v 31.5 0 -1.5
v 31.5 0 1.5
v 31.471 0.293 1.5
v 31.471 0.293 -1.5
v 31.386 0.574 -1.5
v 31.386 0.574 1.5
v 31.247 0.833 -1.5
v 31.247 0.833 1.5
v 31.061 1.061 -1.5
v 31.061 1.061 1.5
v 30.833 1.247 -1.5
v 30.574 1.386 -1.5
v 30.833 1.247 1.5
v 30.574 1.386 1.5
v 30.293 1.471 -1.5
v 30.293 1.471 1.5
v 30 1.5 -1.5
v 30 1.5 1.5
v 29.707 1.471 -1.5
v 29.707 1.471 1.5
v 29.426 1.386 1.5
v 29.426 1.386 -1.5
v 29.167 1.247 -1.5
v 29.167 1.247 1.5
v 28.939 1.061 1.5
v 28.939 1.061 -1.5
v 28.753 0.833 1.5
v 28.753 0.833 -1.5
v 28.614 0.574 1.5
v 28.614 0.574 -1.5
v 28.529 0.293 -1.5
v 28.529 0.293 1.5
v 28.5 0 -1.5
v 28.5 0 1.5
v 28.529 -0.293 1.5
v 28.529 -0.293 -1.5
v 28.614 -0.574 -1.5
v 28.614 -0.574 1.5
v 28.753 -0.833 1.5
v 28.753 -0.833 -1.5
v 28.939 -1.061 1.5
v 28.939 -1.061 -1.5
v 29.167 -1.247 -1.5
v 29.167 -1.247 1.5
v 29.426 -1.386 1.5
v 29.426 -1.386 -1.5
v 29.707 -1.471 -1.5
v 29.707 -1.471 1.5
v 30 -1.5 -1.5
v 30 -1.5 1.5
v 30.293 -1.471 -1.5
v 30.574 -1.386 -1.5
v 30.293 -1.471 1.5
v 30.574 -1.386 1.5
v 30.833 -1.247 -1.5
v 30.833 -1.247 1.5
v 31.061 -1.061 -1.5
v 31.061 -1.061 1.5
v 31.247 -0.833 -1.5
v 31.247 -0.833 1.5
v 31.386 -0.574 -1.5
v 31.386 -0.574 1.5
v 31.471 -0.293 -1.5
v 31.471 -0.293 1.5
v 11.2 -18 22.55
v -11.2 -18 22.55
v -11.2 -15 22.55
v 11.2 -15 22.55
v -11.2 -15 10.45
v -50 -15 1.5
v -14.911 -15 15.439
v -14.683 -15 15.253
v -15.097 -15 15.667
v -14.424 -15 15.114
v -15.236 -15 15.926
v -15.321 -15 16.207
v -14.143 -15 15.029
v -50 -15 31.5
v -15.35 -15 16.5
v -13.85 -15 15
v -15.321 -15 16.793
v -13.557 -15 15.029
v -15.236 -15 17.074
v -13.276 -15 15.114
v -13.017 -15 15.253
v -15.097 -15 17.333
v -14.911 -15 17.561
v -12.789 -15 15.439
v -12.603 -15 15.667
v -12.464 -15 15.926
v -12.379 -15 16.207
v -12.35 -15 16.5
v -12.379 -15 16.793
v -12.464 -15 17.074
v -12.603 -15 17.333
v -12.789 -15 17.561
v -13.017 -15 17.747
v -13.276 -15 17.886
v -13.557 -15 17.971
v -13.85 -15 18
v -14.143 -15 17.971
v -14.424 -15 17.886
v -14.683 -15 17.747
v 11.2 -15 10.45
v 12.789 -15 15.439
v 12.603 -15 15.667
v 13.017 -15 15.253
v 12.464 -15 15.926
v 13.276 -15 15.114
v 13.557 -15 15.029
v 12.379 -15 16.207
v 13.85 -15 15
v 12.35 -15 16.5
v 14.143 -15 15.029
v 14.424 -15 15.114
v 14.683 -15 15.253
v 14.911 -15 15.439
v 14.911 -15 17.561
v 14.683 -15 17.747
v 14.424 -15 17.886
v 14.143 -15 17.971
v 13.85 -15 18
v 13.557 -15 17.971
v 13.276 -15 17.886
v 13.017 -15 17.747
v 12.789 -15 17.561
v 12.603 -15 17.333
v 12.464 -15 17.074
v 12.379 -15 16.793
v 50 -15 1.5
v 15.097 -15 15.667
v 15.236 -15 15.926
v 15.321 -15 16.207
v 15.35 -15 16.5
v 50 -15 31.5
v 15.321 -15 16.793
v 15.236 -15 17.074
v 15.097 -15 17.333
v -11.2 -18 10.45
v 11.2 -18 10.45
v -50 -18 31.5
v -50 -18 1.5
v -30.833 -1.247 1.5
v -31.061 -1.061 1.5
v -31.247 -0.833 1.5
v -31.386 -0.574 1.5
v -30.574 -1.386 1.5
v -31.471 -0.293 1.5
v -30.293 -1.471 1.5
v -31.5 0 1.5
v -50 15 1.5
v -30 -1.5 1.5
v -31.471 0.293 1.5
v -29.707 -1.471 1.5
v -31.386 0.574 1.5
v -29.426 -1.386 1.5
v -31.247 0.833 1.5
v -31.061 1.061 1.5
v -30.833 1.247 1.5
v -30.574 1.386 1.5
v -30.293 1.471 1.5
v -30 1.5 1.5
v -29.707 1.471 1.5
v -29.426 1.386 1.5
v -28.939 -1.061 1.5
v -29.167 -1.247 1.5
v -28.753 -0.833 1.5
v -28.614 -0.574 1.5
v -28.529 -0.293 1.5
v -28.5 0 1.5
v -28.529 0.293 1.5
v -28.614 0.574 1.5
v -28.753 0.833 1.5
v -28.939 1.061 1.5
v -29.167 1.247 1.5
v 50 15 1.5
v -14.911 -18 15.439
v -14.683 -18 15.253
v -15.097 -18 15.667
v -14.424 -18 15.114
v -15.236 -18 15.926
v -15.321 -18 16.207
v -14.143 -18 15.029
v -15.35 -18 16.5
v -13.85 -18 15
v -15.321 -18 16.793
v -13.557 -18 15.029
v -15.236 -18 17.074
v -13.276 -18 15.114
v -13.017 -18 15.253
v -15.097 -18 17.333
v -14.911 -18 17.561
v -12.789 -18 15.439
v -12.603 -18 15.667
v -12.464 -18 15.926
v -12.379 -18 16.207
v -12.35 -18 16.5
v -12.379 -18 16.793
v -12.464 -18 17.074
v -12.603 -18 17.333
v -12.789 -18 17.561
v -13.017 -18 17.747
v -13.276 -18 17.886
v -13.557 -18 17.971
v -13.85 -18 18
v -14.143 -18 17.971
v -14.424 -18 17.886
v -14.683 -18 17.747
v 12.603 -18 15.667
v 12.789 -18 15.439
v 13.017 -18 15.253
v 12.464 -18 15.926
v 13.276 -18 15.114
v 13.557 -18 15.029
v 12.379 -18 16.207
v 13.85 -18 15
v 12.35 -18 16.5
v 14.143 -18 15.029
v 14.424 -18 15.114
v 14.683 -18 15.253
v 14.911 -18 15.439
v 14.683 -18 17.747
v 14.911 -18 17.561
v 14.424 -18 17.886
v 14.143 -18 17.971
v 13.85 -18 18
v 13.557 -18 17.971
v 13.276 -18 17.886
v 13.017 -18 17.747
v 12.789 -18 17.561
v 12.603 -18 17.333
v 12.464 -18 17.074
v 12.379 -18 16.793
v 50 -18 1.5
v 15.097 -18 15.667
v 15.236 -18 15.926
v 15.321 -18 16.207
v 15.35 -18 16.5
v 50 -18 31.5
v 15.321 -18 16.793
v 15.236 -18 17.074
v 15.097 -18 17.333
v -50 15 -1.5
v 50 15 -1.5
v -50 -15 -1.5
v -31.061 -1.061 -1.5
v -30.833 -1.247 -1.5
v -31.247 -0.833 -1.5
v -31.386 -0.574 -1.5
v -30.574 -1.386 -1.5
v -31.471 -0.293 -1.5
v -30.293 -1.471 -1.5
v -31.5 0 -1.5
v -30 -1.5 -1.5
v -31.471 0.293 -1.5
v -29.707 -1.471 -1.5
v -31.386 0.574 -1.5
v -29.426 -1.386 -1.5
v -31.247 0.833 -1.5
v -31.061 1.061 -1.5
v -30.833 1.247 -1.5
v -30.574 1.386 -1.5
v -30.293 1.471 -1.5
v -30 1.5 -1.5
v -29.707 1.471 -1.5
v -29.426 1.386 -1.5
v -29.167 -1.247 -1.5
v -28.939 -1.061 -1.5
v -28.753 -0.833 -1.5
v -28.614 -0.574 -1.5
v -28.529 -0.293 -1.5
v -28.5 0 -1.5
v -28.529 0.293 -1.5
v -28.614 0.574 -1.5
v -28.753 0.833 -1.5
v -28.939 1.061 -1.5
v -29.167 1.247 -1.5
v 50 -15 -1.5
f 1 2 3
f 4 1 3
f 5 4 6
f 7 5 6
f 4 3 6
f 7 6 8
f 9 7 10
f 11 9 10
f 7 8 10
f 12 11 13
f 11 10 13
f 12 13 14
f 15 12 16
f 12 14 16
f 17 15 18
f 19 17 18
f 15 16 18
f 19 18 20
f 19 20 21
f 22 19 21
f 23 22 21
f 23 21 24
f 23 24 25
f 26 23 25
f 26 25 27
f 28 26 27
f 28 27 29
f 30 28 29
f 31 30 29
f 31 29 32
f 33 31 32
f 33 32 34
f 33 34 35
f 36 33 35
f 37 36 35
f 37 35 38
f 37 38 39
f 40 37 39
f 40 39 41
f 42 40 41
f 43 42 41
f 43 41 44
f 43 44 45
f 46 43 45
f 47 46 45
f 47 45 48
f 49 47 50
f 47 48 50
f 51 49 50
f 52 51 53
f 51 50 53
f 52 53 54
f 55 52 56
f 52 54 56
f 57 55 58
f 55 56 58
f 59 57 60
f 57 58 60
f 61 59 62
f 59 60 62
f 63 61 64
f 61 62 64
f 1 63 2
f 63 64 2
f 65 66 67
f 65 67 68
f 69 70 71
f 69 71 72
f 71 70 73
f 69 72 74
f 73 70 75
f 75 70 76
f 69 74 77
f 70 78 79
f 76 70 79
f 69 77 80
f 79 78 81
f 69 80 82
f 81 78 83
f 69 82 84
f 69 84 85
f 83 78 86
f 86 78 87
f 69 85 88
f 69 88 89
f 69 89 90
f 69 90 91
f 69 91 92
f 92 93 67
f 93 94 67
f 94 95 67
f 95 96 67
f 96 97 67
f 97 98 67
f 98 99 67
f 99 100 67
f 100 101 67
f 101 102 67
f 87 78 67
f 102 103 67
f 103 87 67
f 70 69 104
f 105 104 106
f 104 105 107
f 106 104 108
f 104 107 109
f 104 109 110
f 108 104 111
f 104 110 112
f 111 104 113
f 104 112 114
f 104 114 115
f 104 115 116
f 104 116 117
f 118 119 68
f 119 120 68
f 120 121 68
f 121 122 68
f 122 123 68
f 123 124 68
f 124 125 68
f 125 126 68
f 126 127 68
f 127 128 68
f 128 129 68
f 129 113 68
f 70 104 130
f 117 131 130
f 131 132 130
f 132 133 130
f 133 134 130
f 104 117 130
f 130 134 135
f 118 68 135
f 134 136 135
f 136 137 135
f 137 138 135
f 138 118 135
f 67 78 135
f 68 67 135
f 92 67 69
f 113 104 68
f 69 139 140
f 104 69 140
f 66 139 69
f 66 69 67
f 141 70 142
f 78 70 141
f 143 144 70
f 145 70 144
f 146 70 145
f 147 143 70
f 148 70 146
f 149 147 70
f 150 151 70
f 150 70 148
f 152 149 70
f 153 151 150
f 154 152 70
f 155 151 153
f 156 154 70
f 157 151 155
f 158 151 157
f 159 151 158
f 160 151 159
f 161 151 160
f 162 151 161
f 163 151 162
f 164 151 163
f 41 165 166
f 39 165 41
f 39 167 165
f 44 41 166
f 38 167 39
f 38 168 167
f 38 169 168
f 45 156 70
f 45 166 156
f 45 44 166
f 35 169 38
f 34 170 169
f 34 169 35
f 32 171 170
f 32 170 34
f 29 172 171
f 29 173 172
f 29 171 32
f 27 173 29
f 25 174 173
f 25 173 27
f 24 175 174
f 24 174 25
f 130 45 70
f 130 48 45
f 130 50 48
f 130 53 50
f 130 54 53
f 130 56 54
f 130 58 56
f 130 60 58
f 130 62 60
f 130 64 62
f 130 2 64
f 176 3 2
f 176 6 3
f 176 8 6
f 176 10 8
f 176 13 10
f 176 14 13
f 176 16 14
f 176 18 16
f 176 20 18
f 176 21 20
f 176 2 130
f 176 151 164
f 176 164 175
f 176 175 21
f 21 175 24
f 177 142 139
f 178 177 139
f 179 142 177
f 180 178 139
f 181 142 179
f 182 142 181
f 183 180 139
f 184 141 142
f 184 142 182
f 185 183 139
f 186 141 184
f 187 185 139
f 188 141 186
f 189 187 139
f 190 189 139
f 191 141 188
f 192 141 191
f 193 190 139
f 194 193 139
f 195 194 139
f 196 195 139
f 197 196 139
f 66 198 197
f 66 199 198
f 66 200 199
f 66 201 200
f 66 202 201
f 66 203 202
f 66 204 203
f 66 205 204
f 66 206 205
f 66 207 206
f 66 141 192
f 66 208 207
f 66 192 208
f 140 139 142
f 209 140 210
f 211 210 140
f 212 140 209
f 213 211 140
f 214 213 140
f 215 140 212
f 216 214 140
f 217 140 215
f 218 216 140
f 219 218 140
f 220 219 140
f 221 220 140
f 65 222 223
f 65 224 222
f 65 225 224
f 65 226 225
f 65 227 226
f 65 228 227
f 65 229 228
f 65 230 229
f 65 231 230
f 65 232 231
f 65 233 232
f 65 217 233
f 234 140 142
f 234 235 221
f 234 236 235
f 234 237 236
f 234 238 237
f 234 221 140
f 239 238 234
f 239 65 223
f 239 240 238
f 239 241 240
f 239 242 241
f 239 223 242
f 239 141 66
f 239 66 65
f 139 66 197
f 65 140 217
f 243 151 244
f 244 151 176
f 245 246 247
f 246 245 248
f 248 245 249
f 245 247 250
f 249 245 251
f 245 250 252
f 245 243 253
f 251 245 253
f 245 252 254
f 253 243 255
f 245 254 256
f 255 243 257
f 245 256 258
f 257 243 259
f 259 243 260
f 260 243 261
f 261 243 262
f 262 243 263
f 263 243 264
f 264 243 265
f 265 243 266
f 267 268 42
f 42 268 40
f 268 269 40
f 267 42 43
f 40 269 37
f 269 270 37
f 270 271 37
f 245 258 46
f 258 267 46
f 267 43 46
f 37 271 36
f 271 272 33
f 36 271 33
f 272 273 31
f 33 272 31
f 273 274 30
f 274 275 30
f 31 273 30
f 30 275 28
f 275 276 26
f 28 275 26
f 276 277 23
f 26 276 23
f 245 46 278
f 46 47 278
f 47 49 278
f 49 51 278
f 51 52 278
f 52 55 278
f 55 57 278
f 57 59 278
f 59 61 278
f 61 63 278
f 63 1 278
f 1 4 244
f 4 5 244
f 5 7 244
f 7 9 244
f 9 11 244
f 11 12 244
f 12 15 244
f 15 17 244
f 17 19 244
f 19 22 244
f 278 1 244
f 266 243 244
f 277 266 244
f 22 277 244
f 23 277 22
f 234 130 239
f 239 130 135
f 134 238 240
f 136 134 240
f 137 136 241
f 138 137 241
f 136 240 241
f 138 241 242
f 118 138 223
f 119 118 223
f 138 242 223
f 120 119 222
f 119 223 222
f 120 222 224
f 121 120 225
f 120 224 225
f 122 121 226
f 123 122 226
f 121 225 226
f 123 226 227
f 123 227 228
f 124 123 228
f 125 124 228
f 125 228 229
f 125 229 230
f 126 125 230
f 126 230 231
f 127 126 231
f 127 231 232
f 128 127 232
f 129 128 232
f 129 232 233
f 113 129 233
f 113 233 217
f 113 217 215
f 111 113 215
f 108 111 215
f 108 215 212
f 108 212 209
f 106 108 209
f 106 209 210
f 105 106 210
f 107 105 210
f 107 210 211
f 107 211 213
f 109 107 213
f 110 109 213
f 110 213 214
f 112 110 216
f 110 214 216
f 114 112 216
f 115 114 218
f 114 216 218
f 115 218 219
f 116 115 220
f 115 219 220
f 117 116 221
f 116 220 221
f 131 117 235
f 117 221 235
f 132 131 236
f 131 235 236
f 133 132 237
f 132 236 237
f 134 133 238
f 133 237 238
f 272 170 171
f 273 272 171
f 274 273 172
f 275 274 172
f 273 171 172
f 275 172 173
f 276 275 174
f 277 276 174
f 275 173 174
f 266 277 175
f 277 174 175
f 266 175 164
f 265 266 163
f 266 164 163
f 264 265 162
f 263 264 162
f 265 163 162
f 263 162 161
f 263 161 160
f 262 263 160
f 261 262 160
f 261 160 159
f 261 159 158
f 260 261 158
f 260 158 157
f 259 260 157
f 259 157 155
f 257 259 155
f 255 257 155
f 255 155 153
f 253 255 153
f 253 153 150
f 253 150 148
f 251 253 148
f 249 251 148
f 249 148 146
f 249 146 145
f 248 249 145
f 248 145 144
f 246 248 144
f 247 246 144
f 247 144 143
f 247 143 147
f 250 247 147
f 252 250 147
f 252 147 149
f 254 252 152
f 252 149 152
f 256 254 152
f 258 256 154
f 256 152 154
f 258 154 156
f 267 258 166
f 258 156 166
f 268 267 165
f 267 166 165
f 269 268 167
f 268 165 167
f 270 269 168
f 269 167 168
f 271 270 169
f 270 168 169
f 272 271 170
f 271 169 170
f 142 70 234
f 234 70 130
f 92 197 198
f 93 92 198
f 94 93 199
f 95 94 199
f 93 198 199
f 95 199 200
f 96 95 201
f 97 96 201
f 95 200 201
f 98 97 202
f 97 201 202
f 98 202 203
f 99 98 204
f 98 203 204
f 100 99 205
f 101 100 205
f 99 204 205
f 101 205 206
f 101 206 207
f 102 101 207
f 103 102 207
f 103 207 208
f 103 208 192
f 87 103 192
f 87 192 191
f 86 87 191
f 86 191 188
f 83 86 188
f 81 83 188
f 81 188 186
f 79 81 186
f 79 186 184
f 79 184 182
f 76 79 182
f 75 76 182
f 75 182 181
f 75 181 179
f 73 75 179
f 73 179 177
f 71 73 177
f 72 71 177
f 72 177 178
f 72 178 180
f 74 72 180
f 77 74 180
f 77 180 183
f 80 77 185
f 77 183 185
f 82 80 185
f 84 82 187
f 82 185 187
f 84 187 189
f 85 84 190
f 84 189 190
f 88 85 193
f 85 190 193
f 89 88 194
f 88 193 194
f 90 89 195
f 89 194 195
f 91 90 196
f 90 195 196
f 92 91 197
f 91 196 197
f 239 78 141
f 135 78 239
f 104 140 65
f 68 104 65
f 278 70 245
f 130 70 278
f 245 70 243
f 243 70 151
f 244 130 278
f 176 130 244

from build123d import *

# Parameters (mm, degrees)
F0_W     = 100
F0_H     = 30
F1_DEPTH = 1.5
F2_W     = 100
F2_H     = 30
F3_DEPTH = 3
F4_R     = 1.5
F4_W     = 22.4
F4_H     = 12.1
F5_DEPTH = 33.001
F6_R     = 1.5
F7_DEPTH = 3.001


with BuildPart() as f1:
    # F0 (on Top) → F1 (new body, symmetric)
    with BuildSketch(Plane.XY):
        Rectangle(F0_W, F0_H)
    extrude(amount=F1_DEPTH, both=True)

    # F6 (on face) → F7 (cut, through all)
    with BuildSketch(Plane.XY.offset(1.5)):
        with Locations((30, 0)):
            Circle(F6_R)
        with Locations((-30, 0)):
            Circle(F6_R)
    extrude(amount=-F7_DEPTH, mode=Mode.SUBTRACT)


with BuildPart() as f3:
    # F2 (on face) → F3 (new body)
    with BuildSketch(Plane.XZ.offset(15)):
        with Locations((0, 16.5)):
            Rectangle(F2_W, F2_H)
    extrude(amount=F3_DEPTH)

    # F4 (on face) → F5 (cut, through all)
    with BuildSketch(Plane.XZ.offset(18)):
        with Locations((-13.85, 16.5)):
            Circle(F4_R)
        with Locations((13.85, 16.5)):
            Circle(F4_R)
        with Locations((0, 16.5)):
            Rectangle(F4_W, F4_H)
    extrude(amount=-F5_DEPTH, mode=Mode.SUBTRACT)


solid = Compound([f1.part, f3.part])
